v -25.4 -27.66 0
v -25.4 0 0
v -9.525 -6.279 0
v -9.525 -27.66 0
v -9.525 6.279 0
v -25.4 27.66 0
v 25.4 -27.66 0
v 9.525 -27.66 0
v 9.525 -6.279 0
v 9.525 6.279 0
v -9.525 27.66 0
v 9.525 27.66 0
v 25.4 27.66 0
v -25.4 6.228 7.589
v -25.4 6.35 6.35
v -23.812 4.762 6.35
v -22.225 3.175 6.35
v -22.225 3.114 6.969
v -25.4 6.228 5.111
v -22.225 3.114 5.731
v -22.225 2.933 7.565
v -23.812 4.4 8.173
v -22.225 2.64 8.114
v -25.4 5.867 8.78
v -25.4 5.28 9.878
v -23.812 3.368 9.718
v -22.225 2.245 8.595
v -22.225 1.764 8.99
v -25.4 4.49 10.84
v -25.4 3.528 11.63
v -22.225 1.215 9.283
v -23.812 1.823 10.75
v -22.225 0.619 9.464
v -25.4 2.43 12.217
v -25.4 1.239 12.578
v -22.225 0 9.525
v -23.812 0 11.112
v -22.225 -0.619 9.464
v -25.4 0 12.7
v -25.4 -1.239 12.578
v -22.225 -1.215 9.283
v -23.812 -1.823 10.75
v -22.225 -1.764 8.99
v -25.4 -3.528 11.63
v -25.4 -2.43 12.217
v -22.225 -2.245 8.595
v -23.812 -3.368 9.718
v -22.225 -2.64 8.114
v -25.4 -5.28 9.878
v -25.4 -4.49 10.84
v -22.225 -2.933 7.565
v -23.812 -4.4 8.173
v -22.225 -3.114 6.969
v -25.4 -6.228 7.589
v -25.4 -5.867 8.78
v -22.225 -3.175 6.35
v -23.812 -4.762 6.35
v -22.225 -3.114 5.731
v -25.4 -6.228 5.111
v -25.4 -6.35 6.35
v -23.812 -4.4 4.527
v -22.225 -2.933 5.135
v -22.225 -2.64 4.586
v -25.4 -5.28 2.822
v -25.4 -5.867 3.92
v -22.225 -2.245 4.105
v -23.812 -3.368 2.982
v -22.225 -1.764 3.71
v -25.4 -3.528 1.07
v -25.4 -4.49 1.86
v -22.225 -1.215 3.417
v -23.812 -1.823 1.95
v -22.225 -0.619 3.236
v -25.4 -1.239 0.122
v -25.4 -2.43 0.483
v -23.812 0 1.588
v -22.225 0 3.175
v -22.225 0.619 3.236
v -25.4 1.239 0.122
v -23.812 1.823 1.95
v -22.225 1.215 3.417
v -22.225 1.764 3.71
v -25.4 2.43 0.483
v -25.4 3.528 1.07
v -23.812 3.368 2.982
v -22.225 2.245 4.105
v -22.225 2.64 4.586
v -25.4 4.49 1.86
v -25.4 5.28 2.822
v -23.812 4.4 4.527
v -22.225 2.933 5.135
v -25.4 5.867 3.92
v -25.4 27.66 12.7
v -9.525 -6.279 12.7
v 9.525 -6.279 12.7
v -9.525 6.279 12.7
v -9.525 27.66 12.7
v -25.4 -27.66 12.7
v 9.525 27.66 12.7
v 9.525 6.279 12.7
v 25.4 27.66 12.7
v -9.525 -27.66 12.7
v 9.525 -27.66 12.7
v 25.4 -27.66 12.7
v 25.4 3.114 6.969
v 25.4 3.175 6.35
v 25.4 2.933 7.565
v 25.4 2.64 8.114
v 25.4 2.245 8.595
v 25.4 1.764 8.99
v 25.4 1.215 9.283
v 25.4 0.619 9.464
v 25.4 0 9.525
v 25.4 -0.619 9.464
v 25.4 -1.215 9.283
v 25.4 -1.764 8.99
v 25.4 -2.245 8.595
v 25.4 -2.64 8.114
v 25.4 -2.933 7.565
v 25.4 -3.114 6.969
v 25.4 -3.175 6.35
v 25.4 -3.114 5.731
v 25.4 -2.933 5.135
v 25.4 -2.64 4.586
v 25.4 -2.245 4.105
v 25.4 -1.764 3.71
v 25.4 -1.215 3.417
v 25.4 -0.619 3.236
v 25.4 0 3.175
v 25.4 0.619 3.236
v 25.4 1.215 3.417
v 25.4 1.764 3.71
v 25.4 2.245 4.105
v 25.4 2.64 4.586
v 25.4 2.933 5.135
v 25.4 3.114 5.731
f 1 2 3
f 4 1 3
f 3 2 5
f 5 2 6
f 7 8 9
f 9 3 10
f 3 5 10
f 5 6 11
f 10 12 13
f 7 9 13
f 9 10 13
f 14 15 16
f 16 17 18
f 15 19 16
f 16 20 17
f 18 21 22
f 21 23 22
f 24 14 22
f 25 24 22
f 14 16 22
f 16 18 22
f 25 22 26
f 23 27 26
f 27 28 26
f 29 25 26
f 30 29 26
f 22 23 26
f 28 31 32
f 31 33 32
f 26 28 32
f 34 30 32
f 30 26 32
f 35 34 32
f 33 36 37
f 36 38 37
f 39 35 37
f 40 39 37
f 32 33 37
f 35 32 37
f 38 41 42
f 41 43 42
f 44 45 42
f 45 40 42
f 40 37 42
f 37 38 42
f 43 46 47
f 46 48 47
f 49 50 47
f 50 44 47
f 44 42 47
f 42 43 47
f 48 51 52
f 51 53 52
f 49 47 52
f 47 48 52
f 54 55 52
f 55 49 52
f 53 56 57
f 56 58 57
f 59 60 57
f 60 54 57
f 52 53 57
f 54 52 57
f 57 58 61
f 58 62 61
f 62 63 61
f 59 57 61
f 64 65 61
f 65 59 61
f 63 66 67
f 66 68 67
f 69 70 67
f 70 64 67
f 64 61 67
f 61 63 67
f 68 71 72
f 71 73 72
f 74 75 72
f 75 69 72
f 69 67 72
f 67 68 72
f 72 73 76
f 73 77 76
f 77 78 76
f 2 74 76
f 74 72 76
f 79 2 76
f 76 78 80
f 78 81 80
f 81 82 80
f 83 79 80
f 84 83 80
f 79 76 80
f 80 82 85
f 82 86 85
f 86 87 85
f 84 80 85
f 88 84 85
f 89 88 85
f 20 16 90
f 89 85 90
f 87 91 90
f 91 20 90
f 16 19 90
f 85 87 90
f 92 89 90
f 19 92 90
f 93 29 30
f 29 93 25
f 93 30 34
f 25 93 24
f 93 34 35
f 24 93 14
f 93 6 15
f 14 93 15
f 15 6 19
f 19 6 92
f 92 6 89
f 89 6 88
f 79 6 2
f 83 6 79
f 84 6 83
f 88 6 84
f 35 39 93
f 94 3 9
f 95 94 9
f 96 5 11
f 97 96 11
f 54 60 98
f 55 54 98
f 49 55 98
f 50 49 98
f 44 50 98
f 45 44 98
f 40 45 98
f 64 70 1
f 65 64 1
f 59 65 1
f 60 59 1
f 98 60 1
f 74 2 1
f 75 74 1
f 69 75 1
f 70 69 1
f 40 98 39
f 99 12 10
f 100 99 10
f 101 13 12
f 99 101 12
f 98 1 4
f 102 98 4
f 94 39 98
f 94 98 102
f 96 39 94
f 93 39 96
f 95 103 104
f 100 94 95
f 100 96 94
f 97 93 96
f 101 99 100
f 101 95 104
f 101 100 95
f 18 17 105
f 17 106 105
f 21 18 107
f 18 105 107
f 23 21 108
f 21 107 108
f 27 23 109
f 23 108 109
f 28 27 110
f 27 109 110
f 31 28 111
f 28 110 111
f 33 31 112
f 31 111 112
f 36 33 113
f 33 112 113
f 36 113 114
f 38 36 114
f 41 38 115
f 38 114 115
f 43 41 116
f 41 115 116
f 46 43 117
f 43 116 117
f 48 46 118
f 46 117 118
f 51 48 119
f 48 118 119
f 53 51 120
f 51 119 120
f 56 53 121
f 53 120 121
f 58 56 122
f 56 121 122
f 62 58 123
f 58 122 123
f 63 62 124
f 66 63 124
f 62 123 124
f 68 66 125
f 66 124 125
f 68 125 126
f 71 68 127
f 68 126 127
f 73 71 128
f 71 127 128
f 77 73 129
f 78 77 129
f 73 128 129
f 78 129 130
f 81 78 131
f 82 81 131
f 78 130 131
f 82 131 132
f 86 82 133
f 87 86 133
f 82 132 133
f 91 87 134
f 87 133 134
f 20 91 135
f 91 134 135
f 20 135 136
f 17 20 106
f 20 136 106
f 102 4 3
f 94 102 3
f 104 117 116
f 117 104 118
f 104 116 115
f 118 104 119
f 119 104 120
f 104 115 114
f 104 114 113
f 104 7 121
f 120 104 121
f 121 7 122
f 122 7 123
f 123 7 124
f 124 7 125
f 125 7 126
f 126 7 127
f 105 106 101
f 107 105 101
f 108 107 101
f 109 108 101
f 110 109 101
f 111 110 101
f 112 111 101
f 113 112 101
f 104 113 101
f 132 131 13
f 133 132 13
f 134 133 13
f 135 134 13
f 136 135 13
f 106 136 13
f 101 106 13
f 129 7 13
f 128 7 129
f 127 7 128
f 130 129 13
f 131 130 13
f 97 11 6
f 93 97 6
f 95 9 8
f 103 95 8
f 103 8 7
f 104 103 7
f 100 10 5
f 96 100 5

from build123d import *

# Parameters (mm, degrees)
F1_DEPTH       = 12.7
F3_D           = 6.35
F3_CSINK_D     = 12.7
F3_CSINK_ANGLE = 90


with BuildPart() as f1:
    # F0 (on Top) → F1 (new body)
    with BuildSketch(Plane.XY):
        Polygon((-9.525, 27.659873), (-25.4, 27.659873), (-25.4, -27.659873), (-9.525, -27.659873), (-9.525, -6.278621), (0, -6.278621), (0, 6.278621), (-9.525, 6.278621), align=None)
        Polygon((25.4, 27.659873), (9.525, 27.659873), (9.525, 6.278621), (0, 6.278621), (0, -6.278621), (9.525, -6.278621), (9.525, -27.659873), (25.4, -27.659873), align=None)
    extrude(amount=F1_DEPTH)

    # F3 (through all)
    with Locations(Plane(origin=(-25.4, 0, 0), x_dir=(0, -1, 0), z_dir=(-1, 0, 0))):
        with Locations((0, 6.35)):
            CounterSinkHole(F3_D / 2, F3_CSINK_D / 2, counter_sink_angle=F3_CSINK_ANGLE)


solid = f1.part
